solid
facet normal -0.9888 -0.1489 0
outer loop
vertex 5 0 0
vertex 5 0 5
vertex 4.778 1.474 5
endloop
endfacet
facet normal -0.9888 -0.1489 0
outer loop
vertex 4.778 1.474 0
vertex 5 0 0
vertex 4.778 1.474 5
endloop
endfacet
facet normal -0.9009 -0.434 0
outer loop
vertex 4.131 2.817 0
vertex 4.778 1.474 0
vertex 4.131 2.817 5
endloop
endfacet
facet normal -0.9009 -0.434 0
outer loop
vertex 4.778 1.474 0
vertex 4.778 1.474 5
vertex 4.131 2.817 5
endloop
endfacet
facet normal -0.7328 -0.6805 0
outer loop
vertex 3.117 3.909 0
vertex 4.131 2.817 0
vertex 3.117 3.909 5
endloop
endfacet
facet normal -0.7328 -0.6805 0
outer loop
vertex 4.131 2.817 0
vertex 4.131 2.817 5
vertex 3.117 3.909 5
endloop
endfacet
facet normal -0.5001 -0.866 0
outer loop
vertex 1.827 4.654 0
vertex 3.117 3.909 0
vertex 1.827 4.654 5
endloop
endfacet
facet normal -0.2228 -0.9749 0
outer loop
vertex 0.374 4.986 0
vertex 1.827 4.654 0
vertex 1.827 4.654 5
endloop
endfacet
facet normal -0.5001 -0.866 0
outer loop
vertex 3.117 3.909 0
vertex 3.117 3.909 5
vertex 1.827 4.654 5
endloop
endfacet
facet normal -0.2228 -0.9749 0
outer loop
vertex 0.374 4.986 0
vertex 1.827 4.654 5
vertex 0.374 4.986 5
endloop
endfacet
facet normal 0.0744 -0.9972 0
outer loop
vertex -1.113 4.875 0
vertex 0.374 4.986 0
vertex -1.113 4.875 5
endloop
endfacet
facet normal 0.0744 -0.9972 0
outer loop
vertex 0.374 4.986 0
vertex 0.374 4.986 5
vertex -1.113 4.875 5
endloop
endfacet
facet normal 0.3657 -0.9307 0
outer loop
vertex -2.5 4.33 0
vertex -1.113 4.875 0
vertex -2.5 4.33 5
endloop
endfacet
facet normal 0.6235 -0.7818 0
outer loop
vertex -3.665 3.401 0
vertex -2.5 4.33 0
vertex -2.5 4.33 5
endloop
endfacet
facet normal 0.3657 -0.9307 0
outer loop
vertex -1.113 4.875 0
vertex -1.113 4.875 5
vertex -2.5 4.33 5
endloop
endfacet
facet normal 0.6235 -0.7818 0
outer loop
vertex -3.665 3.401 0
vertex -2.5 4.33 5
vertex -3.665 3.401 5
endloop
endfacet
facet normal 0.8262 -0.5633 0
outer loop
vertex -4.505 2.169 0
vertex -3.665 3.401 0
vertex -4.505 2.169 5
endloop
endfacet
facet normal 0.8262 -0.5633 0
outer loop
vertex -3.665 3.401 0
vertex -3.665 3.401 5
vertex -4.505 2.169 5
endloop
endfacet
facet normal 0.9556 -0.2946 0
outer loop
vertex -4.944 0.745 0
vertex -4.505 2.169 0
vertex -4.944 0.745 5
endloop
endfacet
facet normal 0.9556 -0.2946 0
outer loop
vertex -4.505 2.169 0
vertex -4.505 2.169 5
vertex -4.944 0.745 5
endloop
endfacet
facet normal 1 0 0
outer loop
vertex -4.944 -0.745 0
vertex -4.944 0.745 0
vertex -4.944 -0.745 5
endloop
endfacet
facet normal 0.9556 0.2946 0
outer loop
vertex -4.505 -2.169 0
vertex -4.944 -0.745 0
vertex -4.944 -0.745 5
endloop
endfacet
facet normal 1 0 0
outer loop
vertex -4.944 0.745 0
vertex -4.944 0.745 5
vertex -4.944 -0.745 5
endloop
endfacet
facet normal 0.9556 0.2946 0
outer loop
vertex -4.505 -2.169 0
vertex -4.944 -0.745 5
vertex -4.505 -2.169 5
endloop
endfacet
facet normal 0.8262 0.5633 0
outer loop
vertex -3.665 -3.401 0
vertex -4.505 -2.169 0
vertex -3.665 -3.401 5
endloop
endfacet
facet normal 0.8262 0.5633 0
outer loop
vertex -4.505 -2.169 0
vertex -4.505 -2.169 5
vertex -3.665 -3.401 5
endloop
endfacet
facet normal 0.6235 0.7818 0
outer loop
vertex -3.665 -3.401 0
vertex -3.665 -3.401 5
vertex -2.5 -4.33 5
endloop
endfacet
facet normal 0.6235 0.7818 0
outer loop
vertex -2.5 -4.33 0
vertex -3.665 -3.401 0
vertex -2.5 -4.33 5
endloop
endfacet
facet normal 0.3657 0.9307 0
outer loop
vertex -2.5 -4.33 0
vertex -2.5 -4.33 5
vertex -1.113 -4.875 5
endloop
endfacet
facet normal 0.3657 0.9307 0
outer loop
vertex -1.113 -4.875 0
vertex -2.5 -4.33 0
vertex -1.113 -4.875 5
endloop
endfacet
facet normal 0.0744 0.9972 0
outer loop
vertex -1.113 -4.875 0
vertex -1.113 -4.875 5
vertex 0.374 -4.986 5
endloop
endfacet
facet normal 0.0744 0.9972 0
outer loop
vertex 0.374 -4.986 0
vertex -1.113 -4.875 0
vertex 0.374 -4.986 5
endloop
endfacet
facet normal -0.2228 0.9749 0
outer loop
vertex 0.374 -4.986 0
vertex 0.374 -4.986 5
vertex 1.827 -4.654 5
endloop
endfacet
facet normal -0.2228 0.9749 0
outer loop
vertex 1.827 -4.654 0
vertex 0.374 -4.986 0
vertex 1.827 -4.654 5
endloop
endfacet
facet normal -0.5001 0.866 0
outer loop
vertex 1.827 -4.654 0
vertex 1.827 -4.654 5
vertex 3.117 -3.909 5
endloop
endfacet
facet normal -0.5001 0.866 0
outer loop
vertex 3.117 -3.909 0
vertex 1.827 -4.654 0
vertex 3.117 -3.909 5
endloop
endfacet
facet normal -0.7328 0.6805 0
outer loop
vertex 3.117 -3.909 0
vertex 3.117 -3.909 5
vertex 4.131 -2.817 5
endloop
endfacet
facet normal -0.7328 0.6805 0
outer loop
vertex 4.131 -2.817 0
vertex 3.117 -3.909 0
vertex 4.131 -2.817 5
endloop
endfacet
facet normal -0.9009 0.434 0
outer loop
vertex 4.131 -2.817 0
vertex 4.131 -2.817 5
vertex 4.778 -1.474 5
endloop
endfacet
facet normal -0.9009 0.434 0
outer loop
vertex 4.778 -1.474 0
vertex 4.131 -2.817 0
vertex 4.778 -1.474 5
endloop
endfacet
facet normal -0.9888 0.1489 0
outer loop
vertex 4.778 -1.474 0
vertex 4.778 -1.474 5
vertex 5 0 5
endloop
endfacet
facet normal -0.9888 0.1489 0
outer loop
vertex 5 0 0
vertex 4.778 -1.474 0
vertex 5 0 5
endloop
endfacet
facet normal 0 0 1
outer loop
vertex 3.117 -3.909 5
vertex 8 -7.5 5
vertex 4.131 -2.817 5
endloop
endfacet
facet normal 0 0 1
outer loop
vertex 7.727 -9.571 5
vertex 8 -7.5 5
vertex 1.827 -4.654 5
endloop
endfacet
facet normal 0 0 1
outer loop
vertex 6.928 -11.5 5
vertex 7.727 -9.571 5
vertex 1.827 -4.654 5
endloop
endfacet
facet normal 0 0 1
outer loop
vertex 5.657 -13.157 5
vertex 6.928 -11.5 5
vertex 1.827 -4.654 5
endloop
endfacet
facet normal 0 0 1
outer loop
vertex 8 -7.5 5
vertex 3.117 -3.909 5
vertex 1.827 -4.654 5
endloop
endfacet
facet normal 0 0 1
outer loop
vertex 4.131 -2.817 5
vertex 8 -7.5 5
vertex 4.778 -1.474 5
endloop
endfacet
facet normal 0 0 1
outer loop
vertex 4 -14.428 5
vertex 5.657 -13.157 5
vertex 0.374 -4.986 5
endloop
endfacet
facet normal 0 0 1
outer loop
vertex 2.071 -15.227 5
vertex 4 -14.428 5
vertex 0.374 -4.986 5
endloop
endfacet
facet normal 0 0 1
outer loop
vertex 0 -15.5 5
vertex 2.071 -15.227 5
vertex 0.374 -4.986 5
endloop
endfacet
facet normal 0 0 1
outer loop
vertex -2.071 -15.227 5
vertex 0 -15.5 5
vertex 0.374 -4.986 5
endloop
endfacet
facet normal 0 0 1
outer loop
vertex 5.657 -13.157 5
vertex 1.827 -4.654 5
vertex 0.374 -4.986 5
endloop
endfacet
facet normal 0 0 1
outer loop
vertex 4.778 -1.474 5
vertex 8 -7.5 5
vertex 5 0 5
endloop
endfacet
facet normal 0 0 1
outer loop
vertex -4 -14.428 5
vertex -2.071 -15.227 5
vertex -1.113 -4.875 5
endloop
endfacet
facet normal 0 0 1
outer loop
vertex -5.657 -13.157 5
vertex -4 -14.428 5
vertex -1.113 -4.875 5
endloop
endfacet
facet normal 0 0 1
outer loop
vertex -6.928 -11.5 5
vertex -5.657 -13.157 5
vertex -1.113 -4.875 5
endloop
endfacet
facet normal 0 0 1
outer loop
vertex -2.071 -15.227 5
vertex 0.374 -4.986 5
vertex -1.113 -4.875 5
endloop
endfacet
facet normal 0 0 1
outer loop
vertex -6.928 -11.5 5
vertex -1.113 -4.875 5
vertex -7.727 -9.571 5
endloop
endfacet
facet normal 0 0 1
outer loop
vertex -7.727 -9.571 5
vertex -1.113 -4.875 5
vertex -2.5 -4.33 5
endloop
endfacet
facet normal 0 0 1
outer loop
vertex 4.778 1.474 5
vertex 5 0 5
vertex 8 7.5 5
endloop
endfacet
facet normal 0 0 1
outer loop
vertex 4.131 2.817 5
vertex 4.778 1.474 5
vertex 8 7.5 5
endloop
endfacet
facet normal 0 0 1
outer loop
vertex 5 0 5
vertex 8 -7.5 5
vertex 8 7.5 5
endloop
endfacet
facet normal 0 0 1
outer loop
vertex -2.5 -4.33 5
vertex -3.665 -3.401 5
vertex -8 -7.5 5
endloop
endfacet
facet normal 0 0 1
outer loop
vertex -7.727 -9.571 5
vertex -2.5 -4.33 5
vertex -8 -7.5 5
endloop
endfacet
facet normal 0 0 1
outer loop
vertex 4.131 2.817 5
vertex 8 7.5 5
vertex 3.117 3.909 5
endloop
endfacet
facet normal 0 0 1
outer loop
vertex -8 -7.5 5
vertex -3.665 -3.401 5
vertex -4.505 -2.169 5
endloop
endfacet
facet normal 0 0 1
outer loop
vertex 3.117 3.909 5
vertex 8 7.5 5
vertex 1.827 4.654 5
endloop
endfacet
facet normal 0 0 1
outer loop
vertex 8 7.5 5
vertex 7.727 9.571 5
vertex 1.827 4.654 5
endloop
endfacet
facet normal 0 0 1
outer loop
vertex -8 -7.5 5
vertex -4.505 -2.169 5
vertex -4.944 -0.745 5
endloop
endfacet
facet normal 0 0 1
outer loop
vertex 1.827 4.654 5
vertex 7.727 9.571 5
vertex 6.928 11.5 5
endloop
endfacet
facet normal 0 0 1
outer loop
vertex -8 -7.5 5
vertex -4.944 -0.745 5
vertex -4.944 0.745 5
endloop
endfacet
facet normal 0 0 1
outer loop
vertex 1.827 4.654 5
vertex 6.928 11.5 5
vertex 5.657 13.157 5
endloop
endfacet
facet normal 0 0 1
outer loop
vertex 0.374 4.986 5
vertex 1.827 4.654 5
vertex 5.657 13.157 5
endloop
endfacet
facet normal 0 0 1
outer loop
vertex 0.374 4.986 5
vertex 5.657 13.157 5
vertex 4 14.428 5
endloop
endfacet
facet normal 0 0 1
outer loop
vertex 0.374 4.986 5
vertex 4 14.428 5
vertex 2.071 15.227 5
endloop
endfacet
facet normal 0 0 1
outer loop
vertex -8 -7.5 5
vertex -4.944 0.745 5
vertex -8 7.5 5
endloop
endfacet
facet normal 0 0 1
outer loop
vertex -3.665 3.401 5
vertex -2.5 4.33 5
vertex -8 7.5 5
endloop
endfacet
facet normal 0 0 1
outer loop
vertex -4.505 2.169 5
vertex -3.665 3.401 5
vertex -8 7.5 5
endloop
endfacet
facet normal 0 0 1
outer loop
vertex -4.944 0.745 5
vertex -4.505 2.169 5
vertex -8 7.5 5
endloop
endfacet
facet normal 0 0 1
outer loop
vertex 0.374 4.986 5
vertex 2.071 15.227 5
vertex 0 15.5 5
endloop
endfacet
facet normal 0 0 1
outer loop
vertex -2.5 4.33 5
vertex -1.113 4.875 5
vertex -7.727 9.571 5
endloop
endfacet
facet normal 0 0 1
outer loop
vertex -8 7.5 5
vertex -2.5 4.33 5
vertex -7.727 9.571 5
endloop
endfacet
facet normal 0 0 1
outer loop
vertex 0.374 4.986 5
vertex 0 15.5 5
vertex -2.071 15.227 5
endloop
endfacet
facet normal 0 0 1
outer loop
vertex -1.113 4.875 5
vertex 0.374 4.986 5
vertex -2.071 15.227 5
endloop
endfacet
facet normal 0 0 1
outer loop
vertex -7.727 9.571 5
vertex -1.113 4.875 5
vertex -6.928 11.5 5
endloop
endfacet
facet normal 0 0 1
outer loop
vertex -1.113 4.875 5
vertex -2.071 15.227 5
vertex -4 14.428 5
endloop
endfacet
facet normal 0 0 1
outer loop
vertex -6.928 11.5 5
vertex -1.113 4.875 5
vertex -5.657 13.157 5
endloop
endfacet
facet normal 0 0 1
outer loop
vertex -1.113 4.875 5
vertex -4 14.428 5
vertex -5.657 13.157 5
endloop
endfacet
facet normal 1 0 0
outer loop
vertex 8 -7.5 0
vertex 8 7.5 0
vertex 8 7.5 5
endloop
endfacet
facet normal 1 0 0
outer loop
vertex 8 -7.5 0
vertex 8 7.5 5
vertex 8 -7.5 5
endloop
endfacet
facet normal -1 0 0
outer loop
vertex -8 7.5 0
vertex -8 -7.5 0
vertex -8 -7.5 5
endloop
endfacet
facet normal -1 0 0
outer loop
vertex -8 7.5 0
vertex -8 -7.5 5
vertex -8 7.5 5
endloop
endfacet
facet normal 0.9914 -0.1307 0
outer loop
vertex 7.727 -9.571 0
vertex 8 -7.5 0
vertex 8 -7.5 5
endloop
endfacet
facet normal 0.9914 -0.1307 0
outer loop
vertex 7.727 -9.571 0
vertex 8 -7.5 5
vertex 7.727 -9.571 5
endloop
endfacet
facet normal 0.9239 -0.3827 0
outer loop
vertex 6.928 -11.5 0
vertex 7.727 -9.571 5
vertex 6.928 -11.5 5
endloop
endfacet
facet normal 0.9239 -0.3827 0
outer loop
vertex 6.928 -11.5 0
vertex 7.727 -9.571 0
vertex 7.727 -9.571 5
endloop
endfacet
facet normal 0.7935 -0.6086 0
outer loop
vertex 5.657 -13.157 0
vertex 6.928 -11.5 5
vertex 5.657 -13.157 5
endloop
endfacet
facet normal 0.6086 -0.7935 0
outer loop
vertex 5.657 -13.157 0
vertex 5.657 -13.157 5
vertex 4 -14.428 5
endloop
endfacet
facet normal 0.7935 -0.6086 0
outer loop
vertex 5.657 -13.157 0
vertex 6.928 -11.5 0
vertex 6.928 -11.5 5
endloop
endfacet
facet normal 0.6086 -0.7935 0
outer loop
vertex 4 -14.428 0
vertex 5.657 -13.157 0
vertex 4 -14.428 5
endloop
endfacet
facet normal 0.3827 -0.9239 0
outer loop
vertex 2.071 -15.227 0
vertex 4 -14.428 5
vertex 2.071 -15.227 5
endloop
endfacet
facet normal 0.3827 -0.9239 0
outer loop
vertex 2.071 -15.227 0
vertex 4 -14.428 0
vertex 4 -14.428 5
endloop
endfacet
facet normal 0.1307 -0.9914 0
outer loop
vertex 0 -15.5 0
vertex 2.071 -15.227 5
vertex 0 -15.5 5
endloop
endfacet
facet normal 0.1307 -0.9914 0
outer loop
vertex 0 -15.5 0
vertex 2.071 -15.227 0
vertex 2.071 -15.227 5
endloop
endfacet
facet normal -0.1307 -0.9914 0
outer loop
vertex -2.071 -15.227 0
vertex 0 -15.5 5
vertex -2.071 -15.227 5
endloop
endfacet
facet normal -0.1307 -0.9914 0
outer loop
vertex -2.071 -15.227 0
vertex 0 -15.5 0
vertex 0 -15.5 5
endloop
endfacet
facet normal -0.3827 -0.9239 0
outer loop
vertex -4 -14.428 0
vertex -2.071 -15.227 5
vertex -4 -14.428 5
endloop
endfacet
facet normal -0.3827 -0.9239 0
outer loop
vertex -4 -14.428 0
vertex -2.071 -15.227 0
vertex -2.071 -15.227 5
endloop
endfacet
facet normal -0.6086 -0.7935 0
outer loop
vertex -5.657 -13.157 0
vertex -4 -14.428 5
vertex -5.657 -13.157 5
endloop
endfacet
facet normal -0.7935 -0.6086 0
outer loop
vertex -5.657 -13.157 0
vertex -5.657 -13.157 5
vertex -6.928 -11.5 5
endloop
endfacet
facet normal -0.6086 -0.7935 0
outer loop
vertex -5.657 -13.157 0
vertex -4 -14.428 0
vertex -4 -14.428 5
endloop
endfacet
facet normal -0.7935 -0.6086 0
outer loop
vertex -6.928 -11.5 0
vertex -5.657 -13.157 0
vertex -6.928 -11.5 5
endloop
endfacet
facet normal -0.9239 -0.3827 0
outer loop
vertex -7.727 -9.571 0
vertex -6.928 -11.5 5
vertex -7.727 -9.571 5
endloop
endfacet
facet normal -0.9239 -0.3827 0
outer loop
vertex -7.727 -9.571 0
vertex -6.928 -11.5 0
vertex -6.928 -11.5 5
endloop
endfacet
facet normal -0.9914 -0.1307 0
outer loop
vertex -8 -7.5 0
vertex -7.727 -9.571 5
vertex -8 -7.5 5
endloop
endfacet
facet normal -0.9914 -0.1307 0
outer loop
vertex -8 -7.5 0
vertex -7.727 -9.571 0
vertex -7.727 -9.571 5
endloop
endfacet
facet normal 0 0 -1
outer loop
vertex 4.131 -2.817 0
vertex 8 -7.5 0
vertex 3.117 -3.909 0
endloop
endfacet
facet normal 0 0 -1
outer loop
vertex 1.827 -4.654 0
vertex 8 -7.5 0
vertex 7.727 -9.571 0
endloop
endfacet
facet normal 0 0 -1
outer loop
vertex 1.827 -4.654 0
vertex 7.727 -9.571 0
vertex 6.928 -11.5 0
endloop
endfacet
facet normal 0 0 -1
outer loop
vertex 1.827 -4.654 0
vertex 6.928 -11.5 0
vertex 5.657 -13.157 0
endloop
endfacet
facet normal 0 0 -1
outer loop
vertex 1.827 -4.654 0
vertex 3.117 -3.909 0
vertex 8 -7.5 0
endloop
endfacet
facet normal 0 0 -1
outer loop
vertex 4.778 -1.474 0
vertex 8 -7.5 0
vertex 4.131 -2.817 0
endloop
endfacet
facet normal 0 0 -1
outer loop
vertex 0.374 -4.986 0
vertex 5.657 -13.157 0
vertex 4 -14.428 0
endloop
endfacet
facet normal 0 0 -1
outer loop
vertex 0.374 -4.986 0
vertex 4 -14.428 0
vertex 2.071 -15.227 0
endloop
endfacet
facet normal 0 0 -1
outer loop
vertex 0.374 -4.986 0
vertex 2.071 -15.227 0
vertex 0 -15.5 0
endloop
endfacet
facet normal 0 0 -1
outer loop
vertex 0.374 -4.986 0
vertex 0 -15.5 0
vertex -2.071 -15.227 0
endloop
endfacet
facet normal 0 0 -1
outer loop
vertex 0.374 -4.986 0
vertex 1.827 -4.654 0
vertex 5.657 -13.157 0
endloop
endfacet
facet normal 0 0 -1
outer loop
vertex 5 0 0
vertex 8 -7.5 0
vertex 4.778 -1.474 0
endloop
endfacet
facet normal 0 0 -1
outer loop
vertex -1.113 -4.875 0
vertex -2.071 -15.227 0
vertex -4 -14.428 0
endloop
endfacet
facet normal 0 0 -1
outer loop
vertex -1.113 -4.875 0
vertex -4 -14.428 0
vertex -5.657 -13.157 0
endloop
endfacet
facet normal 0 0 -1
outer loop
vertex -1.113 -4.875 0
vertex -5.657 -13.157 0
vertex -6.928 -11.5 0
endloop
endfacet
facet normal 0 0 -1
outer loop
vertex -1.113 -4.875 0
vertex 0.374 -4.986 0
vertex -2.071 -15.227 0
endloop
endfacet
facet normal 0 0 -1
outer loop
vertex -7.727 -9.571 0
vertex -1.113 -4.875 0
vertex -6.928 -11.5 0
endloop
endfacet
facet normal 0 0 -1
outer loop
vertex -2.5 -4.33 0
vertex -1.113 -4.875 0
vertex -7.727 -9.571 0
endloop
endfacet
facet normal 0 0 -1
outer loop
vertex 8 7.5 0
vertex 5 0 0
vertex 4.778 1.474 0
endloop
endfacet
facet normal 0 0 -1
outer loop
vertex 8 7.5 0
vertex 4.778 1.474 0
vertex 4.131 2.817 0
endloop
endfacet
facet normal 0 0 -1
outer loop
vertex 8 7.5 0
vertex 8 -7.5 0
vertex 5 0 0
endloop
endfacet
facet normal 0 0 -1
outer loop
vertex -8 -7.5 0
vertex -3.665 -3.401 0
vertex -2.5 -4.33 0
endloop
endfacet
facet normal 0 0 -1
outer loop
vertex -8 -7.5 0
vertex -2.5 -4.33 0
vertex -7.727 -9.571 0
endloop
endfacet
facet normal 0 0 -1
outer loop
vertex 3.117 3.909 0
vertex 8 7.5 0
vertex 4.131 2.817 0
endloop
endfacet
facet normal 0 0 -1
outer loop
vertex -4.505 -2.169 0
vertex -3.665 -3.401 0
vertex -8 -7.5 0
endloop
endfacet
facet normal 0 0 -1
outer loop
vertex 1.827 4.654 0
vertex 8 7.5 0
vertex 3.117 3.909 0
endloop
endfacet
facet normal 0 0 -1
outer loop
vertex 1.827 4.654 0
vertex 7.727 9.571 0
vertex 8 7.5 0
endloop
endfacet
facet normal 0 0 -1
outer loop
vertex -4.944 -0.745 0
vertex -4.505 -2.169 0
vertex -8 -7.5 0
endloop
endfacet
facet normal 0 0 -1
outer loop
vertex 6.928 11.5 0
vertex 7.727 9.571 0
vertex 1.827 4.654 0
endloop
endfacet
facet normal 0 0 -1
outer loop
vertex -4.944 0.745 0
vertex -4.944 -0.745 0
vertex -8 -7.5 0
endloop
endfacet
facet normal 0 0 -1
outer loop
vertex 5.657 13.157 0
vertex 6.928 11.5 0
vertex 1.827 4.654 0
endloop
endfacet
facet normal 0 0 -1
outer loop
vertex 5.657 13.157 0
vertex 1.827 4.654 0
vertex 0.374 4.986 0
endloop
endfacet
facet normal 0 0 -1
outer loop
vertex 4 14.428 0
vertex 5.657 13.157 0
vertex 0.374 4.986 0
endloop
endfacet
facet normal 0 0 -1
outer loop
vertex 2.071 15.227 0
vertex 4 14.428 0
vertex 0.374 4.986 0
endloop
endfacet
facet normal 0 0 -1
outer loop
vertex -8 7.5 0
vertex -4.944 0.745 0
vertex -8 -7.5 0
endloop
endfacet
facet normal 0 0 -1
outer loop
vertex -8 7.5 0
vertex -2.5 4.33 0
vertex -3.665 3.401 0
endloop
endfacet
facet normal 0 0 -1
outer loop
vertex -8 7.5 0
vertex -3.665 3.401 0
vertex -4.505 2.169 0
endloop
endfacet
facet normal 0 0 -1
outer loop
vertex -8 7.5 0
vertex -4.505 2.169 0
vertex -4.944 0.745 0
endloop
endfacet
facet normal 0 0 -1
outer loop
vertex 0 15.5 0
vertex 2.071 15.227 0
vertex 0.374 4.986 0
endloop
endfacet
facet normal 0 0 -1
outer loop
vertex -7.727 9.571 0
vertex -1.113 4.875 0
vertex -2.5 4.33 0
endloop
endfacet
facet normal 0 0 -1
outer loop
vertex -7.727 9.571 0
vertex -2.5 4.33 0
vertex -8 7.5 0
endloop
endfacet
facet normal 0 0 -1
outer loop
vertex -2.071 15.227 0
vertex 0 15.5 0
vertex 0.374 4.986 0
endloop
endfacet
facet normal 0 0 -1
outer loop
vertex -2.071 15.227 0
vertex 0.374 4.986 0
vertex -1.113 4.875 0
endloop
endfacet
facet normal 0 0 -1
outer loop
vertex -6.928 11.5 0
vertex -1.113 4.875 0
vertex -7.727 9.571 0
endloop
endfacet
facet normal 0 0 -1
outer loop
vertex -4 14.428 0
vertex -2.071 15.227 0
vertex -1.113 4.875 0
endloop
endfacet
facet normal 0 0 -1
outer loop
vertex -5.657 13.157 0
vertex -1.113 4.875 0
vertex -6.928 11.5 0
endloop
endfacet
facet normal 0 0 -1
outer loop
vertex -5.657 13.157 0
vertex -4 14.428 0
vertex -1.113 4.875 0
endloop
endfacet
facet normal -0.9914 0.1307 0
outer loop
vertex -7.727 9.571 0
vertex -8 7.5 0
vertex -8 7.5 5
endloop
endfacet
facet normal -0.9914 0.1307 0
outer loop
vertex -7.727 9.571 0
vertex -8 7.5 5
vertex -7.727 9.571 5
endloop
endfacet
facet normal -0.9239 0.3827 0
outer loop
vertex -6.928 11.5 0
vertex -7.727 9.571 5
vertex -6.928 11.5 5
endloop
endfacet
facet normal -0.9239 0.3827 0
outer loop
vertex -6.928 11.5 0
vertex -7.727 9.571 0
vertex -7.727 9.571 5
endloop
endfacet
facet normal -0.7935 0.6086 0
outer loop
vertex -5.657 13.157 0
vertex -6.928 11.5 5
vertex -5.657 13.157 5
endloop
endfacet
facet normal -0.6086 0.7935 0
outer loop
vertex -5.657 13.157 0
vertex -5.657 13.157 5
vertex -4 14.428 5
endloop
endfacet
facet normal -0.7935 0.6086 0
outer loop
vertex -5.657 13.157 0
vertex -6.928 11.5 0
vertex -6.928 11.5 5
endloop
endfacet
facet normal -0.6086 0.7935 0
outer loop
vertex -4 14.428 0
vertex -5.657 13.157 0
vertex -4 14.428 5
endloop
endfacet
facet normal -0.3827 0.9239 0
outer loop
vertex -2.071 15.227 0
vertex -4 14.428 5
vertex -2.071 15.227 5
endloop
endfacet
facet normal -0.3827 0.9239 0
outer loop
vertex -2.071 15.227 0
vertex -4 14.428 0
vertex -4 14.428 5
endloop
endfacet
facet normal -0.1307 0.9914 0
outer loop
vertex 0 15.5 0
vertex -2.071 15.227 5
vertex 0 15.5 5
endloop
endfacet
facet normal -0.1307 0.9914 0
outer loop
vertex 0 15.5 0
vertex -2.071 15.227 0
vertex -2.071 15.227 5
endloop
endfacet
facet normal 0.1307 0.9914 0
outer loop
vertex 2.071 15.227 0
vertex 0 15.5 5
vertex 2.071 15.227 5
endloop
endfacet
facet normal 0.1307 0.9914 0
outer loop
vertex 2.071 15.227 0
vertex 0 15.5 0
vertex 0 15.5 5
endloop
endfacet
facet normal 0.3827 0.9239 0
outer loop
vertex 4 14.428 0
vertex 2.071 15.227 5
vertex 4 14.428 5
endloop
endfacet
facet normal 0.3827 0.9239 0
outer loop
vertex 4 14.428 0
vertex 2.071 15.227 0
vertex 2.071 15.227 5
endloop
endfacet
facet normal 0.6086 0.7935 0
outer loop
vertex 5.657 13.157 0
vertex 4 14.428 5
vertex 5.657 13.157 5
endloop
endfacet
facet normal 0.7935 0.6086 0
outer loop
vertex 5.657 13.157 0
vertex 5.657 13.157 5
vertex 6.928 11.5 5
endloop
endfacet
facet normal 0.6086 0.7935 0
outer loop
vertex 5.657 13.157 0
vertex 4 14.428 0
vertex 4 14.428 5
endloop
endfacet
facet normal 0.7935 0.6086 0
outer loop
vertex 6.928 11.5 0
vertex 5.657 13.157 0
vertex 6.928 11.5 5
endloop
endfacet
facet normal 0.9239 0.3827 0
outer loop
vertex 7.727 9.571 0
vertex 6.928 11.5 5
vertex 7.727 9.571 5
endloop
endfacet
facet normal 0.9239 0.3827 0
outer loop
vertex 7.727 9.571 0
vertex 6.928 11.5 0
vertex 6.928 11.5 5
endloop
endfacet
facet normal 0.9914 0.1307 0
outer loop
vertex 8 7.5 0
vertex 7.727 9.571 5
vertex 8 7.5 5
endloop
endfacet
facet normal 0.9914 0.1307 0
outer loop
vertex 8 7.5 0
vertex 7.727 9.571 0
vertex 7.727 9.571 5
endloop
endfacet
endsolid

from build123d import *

# Parameters (mm, degrees)
BOSS_EXTRU_1_DEPTH      = 5
ESQUISSE3_R             = 5
ENL_V_MAT_EXTRU_1_DEPTH = 10


with BuildPart() as part:
    # Esquisse2 → Boss.-Extru.1 (new body)
    with BuildSketch(Plane.XY):
        with BuildLine():
            Line((-8, -7.5), (-8, 7.5))
            ThreePointArc((-8, 7.5), (0, 15.5), (8, 7.5))
            Line((8, 7.5), (8, -7.5))
            ThreePointArc((8, -7.5), (0, -15.5), (-8, -7.5))
        make_face()
    extrude(amount=BOSS_EXTRU_1_DEPTH)

    # Esquisse3 → Enlèv. mat.-Extru.1 (cut)
    with BuildSketch(Plane.XY.offset(5)):
        Circle(ESQUISSE3_R)
    extrude(amount=-ENL_V_MAT_EXTRU_1_DEPTH, mode=Mode.SUBTRACT)


solid = part.part
